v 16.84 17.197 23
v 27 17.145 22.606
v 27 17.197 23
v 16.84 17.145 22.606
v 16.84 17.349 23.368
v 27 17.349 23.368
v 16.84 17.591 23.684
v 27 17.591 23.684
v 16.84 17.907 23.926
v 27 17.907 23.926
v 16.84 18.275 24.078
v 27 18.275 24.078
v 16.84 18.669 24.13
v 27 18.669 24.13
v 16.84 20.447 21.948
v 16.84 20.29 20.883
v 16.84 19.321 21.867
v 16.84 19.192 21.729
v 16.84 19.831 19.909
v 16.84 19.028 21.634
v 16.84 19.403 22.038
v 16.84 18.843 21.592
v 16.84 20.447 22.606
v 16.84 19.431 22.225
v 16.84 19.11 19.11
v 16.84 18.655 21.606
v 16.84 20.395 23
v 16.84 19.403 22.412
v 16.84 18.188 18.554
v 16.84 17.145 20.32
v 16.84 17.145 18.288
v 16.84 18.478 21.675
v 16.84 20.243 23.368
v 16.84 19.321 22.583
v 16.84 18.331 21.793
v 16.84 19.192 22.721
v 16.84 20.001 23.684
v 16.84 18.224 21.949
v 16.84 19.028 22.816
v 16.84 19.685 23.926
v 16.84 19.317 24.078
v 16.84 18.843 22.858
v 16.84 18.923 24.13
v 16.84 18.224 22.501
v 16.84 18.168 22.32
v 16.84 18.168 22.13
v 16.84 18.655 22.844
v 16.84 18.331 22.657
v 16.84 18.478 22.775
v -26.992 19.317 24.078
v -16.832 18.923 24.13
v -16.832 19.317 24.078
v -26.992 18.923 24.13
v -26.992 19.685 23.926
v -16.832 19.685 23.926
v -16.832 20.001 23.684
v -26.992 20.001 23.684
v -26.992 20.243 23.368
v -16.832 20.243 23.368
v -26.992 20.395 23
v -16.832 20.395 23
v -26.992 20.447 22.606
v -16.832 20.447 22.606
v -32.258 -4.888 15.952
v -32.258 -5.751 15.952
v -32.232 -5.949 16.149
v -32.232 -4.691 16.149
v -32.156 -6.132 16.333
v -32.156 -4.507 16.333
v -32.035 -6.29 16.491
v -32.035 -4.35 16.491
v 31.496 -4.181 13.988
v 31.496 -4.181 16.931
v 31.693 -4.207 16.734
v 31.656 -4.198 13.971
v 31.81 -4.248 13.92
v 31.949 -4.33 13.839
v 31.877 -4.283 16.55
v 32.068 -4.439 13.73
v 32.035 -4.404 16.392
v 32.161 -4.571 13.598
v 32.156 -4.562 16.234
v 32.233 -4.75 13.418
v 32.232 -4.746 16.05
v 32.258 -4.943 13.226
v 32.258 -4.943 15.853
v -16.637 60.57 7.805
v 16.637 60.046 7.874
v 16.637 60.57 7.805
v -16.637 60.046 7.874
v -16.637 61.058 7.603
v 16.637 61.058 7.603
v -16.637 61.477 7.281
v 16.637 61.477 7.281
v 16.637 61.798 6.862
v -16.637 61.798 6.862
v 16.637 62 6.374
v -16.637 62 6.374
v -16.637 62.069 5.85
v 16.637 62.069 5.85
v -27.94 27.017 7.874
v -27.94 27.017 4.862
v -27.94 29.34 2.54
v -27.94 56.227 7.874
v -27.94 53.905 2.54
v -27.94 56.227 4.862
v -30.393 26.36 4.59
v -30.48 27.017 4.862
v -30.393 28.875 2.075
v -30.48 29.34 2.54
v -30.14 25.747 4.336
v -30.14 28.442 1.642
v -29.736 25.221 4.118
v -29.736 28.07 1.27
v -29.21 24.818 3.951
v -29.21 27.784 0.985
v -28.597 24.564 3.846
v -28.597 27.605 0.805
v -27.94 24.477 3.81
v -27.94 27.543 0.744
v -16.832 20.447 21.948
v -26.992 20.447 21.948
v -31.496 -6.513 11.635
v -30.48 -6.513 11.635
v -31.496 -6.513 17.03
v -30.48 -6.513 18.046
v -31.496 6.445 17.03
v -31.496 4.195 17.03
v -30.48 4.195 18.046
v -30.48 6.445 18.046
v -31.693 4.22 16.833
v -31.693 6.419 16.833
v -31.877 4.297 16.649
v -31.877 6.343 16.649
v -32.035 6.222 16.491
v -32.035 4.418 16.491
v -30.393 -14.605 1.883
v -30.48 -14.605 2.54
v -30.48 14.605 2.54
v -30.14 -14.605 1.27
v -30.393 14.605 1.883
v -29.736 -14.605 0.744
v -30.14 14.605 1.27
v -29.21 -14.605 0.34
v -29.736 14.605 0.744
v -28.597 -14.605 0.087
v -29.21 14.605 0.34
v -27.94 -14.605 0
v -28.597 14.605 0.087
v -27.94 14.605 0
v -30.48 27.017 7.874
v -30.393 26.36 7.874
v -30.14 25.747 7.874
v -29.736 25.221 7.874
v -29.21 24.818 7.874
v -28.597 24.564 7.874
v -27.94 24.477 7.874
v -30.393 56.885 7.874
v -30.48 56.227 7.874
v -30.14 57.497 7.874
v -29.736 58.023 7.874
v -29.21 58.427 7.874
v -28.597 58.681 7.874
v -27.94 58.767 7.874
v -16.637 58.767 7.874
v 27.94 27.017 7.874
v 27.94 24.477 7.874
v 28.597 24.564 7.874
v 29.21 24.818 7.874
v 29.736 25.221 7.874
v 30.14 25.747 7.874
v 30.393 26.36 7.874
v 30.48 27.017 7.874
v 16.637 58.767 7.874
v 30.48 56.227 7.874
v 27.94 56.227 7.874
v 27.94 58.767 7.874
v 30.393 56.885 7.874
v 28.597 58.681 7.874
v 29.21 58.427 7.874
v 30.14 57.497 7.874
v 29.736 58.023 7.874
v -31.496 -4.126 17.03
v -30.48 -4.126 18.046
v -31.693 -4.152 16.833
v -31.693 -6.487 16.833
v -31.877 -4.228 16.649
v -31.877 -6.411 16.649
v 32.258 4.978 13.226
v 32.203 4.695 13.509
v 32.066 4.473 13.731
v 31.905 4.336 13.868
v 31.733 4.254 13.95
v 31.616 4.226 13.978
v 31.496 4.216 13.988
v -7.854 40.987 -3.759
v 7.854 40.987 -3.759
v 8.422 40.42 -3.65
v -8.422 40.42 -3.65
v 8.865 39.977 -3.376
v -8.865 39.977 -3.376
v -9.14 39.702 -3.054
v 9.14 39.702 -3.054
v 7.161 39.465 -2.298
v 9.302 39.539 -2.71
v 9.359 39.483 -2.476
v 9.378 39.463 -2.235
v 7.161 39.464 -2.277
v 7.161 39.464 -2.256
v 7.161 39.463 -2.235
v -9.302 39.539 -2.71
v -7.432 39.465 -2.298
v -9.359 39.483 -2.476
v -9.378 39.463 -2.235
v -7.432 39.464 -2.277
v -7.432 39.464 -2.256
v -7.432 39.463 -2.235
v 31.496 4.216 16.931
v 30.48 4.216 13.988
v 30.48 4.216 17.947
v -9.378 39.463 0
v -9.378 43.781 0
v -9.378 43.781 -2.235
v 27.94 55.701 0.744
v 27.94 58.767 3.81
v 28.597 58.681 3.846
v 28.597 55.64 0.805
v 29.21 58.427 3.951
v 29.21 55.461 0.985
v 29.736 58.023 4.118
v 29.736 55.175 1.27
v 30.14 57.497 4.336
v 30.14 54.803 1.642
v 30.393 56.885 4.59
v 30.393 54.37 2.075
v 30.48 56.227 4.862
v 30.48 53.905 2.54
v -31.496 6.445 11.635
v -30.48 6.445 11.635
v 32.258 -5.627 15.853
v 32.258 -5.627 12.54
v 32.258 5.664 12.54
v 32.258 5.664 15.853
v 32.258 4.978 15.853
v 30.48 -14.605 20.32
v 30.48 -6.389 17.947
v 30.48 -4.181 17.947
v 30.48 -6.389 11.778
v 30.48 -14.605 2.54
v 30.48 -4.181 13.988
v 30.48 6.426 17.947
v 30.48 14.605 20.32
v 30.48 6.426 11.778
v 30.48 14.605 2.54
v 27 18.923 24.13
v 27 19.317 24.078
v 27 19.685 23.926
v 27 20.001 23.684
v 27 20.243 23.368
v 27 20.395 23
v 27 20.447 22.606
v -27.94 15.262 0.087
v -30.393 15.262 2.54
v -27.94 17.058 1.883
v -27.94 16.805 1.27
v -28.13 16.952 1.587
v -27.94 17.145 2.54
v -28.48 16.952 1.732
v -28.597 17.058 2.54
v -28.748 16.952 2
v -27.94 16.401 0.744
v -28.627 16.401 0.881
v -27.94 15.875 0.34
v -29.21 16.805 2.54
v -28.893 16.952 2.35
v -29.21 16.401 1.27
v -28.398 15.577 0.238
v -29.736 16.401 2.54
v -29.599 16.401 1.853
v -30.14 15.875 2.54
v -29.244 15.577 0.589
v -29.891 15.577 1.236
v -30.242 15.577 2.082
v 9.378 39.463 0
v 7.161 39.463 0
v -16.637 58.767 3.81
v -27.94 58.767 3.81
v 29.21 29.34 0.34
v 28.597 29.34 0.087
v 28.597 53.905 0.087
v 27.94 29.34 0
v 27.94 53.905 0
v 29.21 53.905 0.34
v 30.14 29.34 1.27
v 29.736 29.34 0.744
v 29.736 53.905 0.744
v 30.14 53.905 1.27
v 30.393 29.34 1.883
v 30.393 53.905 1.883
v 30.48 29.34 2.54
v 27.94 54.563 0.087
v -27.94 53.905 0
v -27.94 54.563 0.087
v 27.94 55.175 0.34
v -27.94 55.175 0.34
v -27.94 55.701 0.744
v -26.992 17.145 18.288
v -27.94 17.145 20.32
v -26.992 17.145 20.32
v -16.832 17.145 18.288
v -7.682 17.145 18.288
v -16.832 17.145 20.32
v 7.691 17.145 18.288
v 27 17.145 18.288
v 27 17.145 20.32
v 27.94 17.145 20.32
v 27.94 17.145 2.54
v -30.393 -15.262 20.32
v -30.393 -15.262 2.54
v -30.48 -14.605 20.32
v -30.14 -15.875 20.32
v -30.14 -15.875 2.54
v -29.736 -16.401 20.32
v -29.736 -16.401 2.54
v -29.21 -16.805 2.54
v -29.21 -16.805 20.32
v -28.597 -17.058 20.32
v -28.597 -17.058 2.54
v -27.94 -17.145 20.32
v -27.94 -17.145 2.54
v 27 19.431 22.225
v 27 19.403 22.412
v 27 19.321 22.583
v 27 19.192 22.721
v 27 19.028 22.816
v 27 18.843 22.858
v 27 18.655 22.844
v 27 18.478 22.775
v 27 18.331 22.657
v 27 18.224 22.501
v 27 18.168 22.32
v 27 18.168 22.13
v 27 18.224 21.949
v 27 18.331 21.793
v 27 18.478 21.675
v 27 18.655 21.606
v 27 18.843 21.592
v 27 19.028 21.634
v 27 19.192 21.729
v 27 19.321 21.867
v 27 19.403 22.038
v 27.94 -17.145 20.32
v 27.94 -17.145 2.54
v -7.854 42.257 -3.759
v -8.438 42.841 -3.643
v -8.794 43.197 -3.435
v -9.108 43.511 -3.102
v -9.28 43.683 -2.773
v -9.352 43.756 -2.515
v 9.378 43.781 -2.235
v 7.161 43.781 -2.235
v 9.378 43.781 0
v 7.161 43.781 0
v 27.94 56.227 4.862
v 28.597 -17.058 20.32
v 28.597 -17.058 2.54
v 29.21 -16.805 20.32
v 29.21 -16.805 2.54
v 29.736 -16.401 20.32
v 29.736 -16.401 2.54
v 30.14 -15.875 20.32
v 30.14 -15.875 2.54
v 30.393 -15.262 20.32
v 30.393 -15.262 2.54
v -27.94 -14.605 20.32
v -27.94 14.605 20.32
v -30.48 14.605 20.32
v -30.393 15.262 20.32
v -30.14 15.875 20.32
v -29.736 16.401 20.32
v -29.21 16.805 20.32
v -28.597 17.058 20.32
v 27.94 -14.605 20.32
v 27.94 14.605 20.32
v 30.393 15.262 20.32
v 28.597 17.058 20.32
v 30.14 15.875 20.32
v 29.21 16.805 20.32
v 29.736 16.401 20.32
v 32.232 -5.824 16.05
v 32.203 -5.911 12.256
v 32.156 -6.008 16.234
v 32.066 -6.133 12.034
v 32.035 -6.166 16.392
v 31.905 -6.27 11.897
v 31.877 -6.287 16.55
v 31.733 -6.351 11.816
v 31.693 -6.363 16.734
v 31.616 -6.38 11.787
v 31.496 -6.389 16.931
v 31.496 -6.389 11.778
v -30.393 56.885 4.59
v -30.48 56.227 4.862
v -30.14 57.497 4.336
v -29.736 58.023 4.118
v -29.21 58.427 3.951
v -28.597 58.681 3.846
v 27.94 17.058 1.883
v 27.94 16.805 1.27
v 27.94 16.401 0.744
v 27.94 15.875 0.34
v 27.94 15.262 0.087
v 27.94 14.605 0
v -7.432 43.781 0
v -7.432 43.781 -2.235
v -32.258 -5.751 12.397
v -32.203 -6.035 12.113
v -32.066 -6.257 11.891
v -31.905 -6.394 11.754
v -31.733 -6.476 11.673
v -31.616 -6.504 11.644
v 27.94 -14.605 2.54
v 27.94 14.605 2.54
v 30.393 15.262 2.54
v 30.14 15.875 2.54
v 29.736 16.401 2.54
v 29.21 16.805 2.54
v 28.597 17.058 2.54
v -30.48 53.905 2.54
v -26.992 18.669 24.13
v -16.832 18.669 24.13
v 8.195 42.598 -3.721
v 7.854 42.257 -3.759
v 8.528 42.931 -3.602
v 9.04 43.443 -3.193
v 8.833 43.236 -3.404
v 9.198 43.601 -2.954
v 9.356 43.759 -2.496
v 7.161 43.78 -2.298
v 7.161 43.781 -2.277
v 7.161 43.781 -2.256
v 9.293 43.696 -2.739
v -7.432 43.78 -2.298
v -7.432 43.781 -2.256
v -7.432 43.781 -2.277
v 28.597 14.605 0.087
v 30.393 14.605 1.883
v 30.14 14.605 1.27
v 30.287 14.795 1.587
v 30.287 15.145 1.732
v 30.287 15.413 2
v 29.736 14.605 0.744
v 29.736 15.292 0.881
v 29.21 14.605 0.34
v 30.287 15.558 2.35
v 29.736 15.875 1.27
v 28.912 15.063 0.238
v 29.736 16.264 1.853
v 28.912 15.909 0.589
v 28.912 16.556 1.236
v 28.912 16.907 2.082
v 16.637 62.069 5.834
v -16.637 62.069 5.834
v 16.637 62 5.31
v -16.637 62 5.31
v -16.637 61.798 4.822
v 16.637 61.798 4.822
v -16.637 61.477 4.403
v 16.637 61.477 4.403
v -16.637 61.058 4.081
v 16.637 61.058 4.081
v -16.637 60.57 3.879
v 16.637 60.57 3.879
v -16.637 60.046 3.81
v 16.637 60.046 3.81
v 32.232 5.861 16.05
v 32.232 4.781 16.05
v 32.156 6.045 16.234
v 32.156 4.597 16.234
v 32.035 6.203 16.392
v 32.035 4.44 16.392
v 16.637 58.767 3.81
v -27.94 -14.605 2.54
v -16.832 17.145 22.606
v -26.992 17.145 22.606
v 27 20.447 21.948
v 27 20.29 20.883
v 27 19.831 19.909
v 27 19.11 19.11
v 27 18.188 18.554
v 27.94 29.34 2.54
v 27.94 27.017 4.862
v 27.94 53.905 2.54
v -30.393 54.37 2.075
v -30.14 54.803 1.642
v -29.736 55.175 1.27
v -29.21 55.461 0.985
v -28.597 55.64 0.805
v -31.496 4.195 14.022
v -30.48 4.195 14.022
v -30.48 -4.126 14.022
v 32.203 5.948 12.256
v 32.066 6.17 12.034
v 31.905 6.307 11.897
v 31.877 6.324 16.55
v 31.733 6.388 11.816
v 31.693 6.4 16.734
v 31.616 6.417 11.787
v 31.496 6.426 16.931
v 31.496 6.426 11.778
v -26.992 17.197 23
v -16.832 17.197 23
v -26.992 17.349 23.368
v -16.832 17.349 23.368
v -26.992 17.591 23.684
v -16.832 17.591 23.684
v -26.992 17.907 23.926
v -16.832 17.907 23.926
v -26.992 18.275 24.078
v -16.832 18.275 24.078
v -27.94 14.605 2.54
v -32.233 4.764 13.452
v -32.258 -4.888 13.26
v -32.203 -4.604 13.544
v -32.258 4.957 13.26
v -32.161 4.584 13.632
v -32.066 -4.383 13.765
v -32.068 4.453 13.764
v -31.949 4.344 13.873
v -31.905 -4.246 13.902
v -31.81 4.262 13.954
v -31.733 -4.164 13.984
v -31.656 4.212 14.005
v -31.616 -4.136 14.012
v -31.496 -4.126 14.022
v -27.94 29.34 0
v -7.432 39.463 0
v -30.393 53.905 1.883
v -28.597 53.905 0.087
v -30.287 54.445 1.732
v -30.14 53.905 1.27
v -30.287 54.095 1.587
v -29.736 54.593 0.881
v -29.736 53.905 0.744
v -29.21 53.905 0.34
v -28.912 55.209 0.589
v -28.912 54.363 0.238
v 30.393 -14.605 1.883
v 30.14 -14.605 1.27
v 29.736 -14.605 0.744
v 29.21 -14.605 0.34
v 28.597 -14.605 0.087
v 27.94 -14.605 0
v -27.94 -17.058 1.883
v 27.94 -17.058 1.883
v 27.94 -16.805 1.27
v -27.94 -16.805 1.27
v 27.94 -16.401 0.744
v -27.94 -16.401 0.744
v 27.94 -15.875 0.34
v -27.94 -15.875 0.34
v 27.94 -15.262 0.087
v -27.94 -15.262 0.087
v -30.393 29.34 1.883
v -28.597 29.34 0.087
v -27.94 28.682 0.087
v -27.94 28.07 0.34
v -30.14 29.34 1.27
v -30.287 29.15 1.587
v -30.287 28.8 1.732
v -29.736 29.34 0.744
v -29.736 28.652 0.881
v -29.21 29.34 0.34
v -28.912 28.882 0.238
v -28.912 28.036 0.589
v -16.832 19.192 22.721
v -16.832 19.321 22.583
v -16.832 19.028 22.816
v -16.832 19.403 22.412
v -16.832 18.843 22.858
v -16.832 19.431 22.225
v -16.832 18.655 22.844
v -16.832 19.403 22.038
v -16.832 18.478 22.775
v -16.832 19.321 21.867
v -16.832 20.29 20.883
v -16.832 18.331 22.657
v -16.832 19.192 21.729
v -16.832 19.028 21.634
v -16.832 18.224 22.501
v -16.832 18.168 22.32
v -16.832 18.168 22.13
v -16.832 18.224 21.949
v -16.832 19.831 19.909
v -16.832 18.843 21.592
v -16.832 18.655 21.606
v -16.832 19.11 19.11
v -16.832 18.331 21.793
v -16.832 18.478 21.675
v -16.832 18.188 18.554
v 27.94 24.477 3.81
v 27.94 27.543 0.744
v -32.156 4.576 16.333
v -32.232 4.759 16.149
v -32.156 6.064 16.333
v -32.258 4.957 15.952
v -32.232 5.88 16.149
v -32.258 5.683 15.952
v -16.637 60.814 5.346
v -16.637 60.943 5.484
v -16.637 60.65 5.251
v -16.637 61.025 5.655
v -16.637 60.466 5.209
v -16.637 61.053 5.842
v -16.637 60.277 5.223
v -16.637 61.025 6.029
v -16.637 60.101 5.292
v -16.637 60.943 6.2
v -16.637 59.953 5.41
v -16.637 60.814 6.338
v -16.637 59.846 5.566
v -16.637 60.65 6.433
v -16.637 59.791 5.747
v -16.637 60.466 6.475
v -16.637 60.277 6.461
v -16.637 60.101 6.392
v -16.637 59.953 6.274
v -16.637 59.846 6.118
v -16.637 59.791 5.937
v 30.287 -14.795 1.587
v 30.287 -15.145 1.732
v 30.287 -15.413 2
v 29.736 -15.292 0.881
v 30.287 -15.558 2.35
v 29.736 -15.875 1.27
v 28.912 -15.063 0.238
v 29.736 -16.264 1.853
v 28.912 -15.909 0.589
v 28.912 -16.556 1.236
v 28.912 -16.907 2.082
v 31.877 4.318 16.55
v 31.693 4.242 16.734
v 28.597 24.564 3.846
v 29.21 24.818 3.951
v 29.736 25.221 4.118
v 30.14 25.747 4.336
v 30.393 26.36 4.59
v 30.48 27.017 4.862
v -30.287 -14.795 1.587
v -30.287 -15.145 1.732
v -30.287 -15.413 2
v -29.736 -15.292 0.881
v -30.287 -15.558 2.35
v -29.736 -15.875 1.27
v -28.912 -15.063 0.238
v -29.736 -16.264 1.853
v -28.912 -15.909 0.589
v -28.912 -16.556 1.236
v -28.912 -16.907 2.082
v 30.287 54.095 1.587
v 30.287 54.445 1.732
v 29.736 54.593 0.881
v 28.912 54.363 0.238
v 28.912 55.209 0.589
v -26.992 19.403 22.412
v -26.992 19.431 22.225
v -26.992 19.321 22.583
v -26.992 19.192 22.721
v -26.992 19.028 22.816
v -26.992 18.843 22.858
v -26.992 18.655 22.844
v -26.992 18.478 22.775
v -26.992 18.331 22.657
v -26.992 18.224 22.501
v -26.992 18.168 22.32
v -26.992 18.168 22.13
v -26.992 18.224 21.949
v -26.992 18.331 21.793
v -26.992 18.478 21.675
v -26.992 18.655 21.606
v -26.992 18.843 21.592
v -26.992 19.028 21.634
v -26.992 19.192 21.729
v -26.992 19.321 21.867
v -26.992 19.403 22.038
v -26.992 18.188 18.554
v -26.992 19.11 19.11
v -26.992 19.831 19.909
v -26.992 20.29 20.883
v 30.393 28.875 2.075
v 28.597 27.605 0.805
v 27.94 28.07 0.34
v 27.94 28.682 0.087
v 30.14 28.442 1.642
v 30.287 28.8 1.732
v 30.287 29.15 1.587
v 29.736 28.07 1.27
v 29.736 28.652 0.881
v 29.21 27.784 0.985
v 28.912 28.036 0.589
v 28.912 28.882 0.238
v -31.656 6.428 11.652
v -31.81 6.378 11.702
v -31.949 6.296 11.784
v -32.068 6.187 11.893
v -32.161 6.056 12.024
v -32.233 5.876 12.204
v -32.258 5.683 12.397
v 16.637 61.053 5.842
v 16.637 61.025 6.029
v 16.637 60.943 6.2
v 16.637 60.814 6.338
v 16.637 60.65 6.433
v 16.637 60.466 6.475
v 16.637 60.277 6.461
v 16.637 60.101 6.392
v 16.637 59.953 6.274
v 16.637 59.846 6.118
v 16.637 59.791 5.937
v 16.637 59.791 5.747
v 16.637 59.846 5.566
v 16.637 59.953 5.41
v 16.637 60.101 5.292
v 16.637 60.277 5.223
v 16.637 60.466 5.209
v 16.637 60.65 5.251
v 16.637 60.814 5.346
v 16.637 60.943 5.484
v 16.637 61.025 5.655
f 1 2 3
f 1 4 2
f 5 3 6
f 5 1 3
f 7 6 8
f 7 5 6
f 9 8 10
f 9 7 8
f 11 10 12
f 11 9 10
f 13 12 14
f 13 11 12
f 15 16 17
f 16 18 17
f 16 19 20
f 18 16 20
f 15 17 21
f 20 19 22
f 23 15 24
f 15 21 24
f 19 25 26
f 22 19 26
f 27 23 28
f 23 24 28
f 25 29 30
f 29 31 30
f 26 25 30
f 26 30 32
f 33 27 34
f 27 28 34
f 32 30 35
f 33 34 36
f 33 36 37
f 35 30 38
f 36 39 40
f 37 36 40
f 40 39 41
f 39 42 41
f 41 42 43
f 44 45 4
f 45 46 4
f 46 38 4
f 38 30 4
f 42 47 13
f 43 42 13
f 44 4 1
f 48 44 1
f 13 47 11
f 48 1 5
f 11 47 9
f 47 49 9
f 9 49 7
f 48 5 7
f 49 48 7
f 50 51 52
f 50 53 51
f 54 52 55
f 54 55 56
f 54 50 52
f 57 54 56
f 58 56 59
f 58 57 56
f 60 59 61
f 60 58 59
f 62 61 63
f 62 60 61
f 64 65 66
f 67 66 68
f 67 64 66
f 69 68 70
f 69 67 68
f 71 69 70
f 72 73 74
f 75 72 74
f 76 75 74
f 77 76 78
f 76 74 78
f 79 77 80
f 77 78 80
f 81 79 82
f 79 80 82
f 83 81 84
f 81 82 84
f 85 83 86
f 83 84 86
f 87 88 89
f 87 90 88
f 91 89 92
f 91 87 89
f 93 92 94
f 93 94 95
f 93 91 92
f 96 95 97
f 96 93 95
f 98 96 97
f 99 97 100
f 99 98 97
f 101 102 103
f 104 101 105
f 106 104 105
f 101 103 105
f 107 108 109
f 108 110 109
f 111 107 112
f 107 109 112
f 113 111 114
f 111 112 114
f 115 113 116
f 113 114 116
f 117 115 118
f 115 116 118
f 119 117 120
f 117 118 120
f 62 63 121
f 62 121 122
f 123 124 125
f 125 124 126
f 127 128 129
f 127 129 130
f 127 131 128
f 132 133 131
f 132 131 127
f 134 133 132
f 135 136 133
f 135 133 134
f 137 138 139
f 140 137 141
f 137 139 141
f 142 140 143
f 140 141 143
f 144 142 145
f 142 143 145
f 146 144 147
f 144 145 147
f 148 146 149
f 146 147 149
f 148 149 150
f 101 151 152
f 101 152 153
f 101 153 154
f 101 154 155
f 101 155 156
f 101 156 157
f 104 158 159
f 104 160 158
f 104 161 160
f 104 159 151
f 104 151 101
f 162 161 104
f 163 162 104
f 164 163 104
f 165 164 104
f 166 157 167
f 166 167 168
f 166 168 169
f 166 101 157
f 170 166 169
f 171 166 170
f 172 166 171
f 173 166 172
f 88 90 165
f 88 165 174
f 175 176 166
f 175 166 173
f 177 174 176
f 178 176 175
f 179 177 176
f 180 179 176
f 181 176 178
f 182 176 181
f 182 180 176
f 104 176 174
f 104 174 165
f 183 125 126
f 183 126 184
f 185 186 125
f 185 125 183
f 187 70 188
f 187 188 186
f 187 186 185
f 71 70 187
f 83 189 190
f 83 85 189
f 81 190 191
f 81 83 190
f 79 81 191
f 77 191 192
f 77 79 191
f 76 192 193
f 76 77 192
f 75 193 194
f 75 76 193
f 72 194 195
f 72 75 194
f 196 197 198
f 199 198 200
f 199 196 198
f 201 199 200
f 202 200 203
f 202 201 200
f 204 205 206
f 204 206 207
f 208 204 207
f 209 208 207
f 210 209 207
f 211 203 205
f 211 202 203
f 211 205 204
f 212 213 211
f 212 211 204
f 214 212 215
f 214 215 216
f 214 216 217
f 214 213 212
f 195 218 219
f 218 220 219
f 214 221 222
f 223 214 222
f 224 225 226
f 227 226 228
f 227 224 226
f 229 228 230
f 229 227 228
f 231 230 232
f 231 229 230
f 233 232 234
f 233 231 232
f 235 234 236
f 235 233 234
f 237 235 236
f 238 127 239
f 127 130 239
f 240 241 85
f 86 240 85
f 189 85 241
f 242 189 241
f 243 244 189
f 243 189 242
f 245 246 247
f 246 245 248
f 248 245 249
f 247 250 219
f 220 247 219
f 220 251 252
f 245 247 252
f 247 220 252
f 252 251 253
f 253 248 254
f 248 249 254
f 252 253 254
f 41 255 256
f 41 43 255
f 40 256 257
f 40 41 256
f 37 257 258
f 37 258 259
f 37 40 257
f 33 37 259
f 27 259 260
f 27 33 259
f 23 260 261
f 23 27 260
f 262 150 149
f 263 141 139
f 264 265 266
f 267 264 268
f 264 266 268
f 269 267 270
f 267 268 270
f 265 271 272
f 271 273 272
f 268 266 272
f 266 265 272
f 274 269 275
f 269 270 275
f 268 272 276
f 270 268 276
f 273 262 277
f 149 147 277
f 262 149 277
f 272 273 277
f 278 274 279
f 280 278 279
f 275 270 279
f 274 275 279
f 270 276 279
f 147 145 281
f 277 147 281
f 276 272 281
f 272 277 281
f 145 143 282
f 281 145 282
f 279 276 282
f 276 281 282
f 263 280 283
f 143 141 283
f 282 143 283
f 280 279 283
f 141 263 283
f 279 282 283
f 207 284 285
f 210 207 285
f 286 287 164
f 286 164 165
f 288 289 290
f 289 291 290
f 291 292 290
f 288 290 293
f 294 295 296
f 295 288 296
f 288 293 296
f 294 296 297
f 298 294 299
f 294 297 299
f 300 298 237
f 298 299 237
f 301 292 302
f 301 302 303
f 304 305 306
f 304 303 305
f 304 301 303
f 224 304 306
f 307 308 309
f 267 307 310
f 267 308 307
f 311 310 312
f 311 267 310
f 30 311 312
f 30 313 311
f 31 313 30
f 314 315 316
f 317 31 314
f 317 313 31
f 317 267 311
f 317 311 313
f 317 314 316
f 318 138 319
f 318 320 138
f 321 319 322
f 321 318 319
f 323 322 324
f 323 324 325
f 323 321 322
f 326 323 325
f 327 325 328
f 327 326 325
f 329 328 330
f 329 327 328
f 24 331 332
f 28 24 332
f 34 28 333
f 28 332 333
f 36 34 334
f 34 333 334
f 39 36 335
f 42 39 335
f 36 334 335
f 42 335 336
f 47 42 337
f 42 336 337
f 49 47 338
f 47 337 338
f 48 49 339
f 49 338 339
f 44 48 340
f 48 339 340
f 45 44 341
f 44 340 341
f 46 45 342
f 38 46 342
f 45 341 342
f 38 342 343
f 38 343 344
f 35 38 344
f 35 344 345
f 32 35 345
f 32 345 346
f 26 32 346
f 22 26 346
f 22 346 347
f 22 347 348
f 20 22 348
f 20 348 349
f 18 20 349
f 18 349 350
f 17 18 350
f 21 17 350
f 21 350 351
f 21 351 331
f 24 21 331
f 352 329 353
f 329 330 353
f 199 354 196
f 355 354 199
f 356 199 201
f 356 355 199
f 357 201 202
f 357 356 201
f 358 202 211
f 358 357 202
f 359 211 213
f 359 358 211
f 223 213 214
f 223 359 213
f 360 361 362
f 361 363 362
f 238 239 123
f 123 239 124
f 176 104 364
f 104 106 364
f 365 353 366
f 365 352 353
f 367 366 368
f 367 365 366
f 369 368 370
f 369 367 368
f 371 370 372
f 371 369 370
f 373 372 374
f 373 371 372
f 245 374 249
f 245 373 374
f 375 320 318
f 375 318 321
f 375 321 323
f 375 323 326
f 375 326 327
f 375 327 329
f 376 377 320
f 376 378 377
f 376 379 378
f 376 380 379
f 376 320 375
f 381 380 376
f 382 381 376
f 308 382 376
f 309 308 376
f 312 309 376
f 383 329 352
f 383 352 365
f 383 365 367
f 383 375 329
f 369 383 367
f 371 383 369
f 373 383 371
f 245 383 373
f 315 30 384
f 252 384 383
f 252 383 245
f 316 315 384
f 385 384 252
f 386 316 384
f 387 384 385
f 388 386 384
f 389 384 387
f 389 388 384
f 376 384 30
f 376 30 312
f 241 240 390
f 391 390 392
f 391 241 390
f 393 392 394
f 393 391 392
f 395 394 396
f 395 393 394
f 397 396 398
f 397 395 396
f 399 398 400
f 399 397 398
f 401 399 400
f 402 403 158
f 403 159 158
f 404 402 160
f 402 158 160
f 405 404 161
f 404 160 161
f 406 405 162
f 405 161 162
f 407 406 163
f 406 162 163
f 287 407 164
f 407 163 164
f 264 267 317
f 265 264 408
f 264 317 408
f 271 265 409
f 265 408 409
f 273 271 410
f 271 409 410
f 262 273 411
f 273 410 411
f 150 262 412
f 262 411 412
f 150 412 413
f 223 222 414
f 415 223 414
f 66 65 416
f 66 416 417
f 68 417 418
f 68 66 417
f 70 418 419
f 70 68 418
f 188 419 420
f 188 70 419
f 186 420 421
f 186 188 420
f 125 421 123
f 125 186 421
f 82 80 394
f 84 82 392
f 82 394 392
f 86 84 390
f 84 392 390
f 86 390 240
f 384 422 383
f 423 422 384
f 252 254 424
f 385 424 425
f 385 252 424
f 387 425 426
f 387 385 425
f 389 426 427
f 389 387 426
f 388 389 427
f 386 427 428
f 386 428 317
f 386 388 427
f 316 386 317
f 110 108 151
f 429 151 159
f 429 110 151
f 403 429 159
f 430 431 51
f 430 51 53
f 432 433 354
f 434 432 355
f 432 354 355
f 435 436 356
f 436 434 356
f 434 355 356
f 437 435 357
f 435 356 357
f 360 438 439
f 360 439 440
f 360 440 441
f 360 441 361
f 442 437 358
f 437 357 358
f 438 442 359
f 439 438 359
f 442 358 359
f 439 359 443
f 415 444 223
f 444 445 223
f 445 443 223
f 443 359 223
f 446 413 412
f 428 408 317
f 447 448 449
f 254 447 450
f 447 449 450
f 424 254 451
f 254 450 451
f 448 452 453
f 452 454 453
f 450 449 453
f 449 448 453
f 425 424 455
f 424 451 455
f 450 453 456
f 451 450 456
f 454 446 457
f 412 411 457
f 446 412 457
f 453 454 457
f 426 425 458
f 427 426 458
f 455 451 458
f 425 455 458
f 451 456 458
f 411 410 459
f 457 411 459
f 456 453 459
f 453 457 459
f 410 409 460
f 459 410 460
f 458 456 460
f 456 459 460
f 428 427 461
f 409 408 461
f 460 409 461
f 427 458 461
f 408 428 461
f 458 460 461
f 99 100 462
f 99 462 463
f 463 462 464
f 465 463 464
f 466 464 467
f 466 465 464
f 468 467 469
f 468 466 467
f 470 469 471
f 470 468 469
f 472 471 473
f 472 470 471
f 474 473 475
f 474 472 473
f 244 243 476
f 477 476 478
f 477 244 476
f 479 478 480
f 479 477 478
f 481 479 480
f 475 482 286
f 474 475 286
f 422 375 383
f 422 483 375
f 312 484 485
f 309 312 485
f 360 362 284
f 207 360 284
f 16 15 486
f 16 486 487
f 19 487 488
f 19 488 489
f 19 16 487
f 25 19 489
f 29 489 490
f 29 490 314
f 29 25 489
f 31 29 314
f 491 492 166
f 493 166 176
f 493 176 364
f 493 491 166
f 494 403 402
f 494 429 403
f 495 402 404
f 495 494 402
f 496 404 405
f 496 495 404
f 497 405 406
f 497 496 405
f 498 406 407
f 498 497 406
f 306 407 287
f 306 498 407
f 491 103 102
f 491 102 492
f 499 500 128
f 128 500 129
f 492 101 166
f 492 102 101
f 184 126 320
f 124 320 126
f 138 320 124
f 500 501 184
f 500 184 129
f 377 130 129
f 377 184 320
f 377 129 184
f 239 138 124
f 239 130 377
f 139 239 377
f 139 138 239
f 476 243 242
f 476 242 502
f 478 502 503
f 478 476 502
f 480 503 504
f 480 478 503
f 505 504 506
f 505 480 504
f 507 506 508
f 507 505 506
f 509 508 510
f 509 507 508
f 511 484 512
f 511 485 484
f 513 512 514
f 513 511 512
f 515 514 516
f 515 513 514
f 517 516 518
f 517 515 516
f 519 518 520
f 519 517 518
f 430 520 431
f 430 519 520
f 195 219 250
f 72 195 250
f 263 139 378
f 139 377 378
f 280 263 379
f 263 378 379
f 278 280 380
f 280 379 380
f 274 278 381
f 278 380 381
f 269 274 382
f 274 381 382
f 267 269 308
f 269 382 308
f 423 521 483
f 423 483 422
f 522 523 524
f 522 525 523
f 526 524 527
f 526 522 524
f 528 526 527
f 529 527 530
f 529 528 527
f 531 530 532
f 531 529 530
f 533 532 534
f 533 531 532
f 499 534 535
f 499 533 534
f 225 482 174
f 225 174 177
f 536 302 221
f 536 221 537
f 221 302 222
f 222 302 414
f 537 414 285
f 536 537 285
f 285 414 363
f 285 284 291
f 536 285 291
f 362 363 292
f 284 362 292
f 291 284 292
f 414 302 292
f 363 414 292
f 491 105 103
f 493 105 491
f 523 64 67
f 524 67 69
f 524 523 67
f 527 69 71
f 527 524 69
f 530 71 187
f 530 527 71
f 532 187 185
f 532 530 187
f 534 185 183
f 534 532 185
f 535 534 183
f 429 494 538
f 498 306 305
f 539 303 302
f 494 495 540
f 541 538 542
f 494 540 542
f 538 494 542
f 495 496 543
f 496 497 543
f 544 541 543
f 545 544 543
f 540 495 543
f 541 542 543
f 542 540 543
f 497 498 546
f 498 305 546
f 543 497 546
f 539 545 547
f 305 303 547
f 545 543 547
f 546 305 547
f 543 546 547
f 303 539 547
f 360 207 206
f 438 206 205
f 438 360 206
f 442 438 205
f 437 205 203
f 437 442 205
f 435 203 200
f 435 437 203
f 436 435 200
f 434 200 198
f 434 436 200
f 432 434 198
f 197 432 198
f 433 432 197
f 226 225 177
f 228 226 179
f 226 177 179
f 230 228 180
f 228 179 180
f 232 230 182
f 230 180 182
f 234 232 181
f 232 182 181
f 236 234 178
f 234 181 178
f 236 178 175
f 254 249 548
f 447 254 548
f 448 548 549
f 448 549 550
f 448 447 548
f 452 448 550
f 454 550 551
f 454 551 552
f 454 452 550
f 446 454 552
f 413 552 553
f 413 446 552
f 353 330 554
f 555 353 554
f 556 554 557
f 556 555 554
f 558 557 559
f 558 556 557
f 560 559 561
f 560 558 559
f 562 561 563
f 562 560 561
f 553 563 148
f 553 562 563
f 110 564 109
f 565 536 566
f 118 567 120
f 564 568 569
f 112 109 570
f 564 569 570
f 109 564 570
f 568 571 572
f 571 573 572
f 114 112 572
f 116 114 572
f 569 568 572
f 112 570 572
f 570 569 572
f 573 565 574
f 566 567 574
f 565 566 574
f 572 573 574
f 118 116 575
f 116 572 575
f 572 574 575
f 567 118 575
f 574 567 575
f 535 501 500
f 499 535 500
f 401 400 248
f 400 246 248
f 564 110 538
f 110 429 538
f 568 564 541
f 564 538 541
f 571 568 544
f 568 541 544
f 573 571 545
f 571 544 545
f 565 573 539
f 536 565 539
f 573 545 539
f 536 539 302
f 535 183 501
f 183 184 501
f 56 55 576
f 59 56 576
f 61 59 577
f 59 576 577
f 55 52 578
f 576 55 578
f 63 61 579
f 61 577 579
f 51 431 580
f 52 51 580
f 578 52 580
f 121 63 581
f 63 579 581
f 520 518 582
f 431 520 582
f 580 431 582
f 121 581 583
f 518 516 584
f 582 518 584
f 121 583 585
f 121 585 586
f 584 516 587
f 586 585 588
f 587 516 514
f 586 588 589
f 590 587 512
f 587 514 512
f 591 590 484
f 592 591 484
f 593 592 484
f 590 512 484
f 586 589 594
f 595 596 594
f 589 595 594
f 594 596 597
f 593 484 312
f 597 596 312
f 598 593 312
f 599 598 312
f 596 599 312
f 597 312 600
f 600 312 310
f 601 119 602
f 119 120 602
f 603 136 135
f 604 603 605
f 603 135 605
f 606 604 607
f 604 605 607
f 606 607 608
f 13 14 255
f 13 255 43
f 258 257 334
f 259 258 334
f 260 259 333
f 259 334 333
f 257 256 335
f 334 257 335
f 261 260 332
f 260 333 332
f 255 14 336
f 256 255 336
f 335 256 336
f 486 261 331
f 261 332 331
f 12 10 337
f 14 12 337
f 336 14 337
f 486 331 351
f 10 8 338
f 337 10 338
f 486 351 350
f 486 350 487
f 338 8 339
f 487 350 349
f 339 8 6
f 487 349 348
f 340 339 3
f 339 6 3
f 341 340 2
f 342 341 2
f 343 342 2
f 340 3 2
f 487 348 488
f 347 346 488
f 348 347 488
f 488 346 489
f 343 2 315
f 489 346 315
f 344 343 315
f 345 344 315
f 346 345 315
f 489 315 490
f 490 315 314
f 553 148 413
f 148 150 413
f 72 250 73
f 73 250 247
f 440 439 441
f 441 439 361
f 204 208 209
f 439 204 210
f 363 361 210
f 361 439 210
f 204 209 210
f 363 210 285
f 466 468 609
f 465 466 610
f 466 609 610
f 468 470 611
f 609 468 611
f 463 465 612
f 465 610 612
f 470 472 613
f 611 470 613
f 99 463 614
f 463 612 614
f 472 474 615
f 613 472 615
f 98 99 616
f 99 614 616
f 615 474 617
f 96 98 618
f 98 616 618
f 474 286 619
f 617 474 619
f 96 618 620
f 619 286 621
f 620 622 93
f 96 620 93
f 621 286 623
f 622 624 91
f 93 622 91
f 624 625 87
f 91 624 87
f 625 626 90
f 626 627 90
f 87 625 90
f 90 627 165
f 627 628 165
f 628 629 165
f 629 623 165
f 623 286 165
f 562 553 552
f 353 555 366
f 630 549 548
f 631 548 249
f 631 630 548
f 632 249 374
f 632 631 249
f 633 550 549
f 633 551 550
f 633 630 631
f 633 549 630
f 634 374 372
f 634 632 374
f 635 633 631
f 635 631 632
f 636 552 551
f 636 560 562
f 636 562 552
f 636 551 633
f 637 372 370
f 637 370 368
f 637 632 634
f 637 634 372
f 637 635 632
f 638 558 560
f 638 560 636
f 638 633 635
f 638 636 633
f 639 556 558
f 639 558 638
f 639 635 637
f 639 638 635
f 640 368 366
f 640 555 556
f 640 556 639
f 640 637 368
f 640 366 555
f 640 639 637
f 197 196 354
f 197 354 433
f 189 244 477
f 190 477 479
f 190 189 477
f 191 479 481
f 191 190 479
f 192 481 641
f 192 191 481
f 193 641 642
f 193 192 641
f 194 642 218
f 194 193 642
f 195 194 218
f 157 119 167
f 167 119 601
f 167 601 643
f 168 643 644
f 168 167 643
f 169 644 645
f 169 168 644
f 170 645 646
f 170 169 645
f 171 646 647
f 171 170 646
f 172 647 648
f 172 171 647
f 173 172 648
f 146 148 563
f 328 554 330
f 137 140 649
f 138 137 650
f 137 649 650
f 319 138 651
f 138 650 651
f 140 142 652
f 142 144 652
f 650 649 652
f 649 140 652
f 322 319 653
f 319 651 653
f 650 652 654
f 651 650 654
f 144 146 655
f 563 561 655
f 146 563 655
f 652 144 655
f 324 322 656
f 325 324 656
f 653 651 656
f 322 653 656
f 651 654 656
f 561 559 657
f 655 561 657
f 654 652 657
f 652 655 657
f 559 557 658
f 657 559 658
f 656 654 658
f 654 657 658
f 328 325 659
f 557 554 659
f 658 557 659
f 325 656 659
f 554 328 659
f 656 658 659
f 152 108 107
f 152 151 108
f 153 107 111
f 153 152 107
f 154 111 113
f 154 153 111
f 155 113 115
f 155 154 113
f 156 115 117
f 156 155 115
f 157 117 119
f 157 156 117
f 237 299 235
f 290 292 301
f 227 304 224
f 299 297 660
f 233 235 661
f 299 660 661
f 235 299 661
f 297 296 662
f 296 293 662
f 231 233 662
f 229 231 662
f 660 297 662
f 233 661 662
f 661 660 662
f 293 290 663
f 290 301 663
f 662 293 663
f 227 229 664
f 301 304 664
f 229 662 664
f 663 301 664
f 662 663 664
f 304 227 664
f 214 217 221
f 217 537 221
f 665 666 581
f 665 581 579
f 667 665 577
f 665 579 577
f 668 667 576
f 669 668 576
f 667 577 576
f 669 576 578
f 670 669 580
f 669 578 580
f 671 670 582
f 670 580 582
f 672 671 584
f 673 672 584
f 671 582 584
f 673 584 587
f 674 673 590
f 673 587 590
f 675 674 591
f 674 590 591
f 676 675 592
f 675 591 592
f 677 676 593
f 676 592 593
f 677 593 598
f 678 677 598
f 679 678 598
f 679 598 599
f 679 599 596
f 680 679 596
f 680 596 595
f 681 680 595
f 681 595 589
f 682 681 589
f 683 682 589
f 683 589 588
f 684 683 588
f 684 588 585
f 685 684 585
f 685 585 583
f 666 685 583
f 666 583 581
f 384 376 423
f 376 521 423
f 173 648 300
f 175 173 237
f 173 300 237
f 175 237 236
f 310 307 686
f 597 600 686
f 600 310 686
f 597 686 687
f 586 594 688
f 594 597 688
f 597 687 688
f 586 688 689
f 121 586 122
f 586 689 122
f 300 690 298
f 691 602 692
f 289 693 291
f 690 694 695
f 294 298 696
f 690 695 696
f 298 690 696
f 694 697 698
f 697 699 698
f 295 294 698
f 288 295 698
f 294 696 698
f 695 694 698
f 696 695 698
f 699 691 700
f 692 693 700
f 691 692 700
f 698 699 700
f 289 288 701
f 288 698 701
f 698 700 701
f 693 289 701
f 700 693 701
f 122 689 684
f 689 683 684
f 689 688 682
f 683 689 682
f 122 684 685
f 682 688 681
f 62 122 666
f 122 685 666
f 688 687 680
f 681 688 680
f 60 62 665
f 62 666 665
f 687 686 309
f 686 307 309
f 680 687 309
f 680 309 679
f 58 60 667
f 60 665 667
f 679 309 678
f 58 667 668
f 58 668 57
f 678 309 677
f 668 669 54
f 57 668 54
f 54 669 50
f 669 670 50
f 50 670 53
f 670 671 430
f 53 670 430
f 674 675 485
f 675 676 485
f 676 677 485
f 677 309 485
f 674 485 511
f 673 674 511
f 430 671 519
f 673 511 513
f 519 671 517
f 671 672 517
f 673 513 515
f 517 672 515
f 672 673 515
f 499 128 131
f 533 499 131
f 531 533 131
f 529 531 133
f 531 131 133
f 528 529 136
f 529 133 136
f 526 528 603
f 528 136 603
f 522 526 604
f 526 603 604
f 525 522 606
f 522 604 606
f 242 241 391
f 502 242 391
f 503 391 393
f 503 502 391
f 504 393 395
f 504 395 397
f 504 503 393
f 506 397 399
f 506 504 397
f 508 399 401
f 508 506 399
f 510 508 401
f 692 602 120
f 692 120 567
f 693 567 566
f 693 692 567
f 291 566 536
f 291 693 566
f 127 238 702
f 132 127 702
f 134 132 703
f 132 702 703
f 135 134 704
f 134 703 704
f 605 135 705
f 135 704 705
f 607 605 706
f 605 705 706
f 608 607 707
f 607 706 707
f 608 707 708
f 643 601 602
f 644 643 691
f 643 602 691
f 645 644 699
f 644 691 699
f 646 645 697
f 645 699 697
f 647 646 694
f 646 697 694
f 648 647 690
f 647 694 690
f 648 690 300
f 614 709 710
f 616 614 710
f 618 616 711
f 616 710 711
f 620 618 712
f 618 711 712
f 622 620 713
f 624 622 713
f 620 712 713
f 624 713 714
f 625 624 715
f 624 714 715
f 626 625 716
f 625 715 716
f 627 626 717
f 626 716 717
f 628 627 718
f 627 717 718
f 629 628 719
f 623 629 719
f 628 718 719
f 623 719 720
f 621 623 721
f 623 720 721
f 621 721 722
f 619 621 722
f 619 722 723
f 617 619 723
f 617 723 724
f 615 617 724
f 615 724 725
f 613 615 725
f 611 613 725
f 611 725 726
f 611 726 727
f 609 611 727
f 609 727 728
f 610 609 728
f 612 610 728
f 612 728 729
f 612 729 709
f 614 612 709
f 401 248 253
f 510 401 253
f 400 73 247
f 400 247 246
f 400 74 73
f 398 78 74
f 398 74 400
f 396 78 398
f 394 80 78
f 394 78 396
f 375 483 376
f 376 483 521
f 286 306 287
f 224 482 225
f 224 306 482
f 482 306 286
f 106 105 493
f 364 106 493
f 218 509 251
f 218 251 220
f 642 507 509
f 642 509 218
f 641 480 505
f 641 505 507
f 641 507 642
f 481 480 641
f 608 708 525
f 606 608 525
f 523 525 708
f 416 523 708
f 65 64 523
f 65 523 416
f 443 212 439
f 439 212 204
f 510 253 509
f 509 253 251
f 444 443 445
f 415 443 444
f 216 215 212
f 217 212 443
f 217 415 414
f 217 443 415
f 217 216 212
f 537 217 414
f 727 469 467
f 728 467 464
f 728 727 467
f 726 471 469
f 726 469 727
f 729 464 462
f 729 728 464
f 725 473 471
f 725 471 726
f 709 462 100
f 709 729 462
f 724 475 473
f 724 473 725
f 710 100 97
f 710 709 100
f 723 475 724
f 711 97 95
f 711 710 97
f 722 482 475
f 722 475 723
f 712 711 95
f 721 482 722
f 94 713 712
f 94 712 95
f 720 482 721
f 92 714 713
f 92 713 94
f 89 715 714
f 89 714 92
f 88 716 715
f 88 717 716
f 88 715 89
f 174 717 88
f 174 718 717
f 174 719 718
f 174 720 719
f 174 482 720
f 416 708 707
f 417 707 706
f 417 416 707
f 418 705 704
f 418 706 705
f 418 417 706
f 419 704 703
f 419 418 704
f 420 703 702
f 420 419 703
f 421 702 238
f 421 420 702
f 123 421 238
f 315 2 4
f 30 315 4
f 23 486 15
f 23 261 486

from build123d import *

# Parameters (mm, degrees)
F0_W           = 60.96
F0_H           = 34.29
F1_DEPTH       = 20.32
F2_T           = -2.54
F3_R           = 2.54
F4_W           = 60.96
F4_H           = 34.29
F5_DEPTH       = 7.874
F6_SIZE        = 3.81
F7_T           = -2.54
F8_W           = 10.16
F8_H           = 3.81
F8_H_2         = 2.032
F9_DEPTH       = 3.302
F10_R          = 2.54
F12_D          = 1.27
F14_DEPTH      = 3.7592
F15_W          = 14.5933912136
F15_H          = 2.2978205234
F16_DEPTH      = 25.4
F17_F1_R       = 1.524
F17_F2_R       = 1.524
F17_F3_R       = 1.524
F17_F4_R       = 1.524
F17_2_T1_DEPTH = 26.3766839159
F17_2_T3_DEPTH = 11.938
F19_T1_DEPTH   = 28.459343391
F19_T3_DEPTH   = 28.459343391
F18_W          = 33.274
F18_H          = 4.064
F20_DEPTH      = 3.302
F22_D          = 1.27
F23_R          = 2.023593808
F26_DEPTH      = 1.778
F27_SIZE       = 1.77799
F28_R          = 0.762
F29_DEPTH      = 1.778
F30_SIZE       = 1.77799
F31_R          = 0.762


# Not quite as in the source:
# - a fillet or chamfer that OpenCascade refuses, or shapes differently, is made with other operations: its cross-section is extruded or revolved along the edge and cut away or added
# - a fillet or chamfer is up to 0.001 mm smaller than in the source, because OpenCascade refuses the exact size


with BuildPart() as f1:
    # F0 (on Top) → F1 (new body)
    with BuildSketch(Plane.XY):
        Rectangle(F0_W, F0_H)
    extrude(amount=F1_DEPTH)

    # F2
    f2_openings = [f1.faces().sort_by_distance(p)[0] for p in [
        (0, 0, 20.32),
    ]]
    offset(amount=F2_T, openings=f2_openings)

    # F3
    f3_edges = [f1.edges().sort_by_distance(p)[0] for p in [
        (0, -17.145, 0),
        (-30.48, 0, 0),
        (0, 17.145, 0),
        (30.48, 0, 0),
        (-30.48, -17.145, 10.16),
        (-30.48, 17.145, 10.16),
        (30.48, 17.145, 10.16),
        (30.48, -17.145, 10.16),
    ]]
    fillet(f3_edges, radius=F3_R)

    # F8 (on face) → F9 (join)
    with BuildSketch(Plane(origin=(0, 17.145, 0), x_dir=(-1, 0, 0), z_dir=(0, 1, 0))):
        with Locations((21.9121703571, 22.225)):
            Rectangle(F8_W, F8_H)
        with Locations((21.9121703571, 19.304)):
            Rectangle(F8_W, F8_H_2)
        with Locations((-21.9202, 19.304)):
            Rectangle(F8_W, F8_H_2)
        with Locations((-21.9202, 22.225)):
            Rectangle(F8_W, F8_H)
    extrude(amount=F9_DEPTH)

    # F12 (through all)
    with Locations(Plane(origin=(-26.9921703571, 0, 0), x_dir=(0, -1, 0), z_dir=(-1, 0, 0))):
        with Locations((-18.796, 22.225)):
            Hole(F12_D / 2)

    # F17: fillet of radius 1.524 on 4 edges, made by hand

    # F17_f1
    f17_f1_edges = [f1.edges().sort_by_distance(p)[0] for p in [
        (21.9202, 17.145, 24.13),
    ]]
    fillet(f17_f1_edges, radius=F17_F1_R)

    # F17_f2
    f17_f2_edges = [f1.edges().sort_by_distance(p)[0] for p in [
        (-21.9121703571, 17.145, 24.13),
    ]]
    fillet(f17_f2_edges, radius=F17_F2_R)

    # F17_f3
    f17_f3_edges = [f1.edges().sort_by_distance(p)[0] for p in [
        (-21.9121703571, 20.447, 24.13),
    ]]
    fillet(f17_f3_edges, radius=F17_F3_R)

    # F17_f4
    f17_f4_edges = [f1.edges().sort_by_distance(p)[0] for p in [
        (21.9202, 20.447, 24.13),
    ]]
    fillet(f17_f4_edges, radius=F17_F4_R)

    # F19: fillet of radius 3.6792614691 on 2 edges, made by hand

    # F19_s2 → F19_t1 (cut)
    with BuildSketch(Plane.YZ.offset(-36.1418420526)):
        with BuildLine():
            ThreePointArc((17.145, 18.288), (19.4994969888, 19.4832265773), (20.447, 21.9478686782))
            Line((20.447, 21.9478686782), (20.447, 18.288))
            Line((20.447, 18.288), (17.145, 18.288))
        make_face()
    extrude(amount=F19_T1_DEPTH, mode=Mode.SUBTRACT)

    # F19_s4 → F19_t3 (cut)
    with BuildSketch(Plane.YZ.offset(7.6905283045)):
        with BuildLine():
            ThreePointArc((20.447, 21.9478686782), (19.4994969888, 19.4832265773), (17.145, 18.288))
            Line((17.145, 18.288), (20.447, 18.288))
            Line((20.447, 18.288), (20.447, 21.9478686782))
        make_face()
    extrude(amount=F19_T3_DEPTH, mode=Mode.SUBTRACT)

    # F25 (on face) → F26 (join)
    with BuildSketch(Plane(origin=(-30.48, 0, 0), x_dir=(0, -1, 0), z_dir=(-1, 0, 0))):
        Polygon((-4.1945250705, 18.0457551032), (-6.445246283, 18.0457551032), (-6.445246283, 11.6346105933), (6.5134512261, 11.6346105933), (6.5134512261, 18.0457551032), (4.12632199, 18.0457551032), (4.12632199, 14.0217393637), (-4.1945250705, 14.0217393637), align=None)
    extrude(amount=F26_DEPTH)

    # F27 (size 1.778 in the source; OpenCascade refuses exactly that, so slightly less here)
    f27_edges = [f1.edges().sort_by_distance(p)[0] for p in [
        (-32.258, 5.319886, 18.045755),
        (-32.258, -5.319887, 18.045755),
    ]]
    chamfer(f27_edges, length=F27_SIZE)

    # F28
    f28_edges = [f1.edges().sort_by_distance(p)[0] for p in [
        (-32.258, 6.445246, 13.951188),
        (-32.258, 5.319886, 16.267765),
        (-32.258, -0.034102, 11.634611),
        (-32.258, 4.194525, 15.144752),
        (-32.258, -6.513451, 13.951188),
        (-32.258, 0.034102, 14.021739),
        (-32.258, -5.319887, 16.267765),
        (-32.258, -4.126322, 15.144752),
    ]]
    fillet(f28_edges, radius=F28_R)

    # F24 (on face) → F29 (join)
    with BuildSketch(Plane.YZ.offset(30.48)):
        Polygon((-4.1808448732, 17.946805805), (-6.3891597092, 17.946805805), (-6.3891597092, 11.7778191343), (6.4262, 11.7778191343), (6.4262, 17.946805805), (4.2164, 17.946805805), (4.2164, 13.9876191343), (-4.1808448732, 13.9876191343), align=None)
    extrude(amount=F29_DEPTH)

    # F30 (size 1.778 in the source; OpenCascade refuses exactly that, so slightly less here)
    f30_edges = [f1.edges().sort_by_distance(p)[0] for p in [
        (32.258, -5.285002, 17.946806),
        (32.258, 5.3213, 17.946806),
    ]]
    chamfer(f30_edges, length=F30_SIZE)

    # F31
    f31_edges = [f1.edges().sort_by_distance(p)[0] for p in [
        (32.258, -6.38916, 13.973317),
        (32.258, -5.285002, 16.168816),
        (32.258, 0.01852, 11.777819),
        (32.258, -4.180845, 15.078217),
        (32.258, 6.4262, 13.973317),
        (32.258, 0.017778, 13.987619),
        (32.258, 5.3213, 16.168816),
        (32.258, 4.2164, 15.078217),
    ]]
    fillet(f31_edges, radius=F31_R)


with BuildPart() as f5:
    # F4 (on Top) → F5 (new body)
    with BuildSketch(Plane.XY):
        with Locations((0, 41.6224255873)):
            Rectangle(F4_W, F4_H)
    extrude(amount=F5_DEPTH)

    # F6
    f6_edges = [f5.edges().sort_by_distance(p)[0] for p in [
        (0, 58.767426, 0),
        (0, 24.477426, 0),
    ]]
    chamfer(f6_edges, length=F6_SIZE)

    # F7
    f7_openings = [f5.faces().sort_by_distance(p)[0] for p in [
        (0, 41.622426, 7.874),
    ]]
    offset(amount=F7_T, openings=f7_openings)

    # F10
    f10_edges = [f5.edges().sort_by_distance(p)[0] for p in [
        (0, 54.957426, 0),
        (0, 28.287426, 0),
        (30.48, 26.382426, 1.905),
        (30.48, 41.622426, 0),
        (30.48, 56.862426, 1.905),
        (-30.48, 56.862426, 1.905),
        (-30.48, 41.622426, 0),
        (-30.48, 58.767426, 5.842),
        (-30.48, 26.382426, 1.905),
        (-30.48, 24.477426, 5.842),
        (30.48, 24.477426, 5.842),
        (30.48, 58.767426, 5.842),
    ]]
    fillet(f10_edges, radius=F10_R)

    # F13 (on face) → F14 (join)
    with BuildSketch(Plane(origin=(0, 0, 0), x_dir=(1, 0, 0), z_dir=(0, 0, -1))):
        Polygon((-9.3783419579, -43.7814255873), (0, -43.7814255873), (9.3783419579, -43.7814255873), (9.3783419579, -39.4634255873), (-9.3783419579, -39.4634255873), align=None)
    extrude(amount=F14_DEPTH)

    # F15 (on face) → F16 (cut)
    with BuildSketch(Plane.XZ.offset(-39.4634255873)):
        with Locations((-0.1355621498, -1.1489102617)):
            Rectangle(F15_W, F15_H)
    extrude(amount=-F16_DEPTH, mode=Mode.SUBTRACT)

    # F17#2: fillet of radius 1.524 on 4 edges, made by hand

    # F17_2_s2 → F17_2_t1 (cut)
    with BuildSketch(Plane.YZ.offset(-13.1883419579)):
        with BuildLine():
            ThreePointArc((42.2574255873, -3.7592), (43.3350563218, -3.3128307345), (43.7814255873, -2.2352))
            Line((43.7814255873, -2.2352), (43.7814255873, -3.7592))
            Line((43.7814255873, -3.7592), (42.2574255873, -3.7592))
        make_face()
        with BuildLine():
            ThreePointArc((40.9874255873, -3.7592), (39.9097948527, -3.3128307345), (39.4634255873, -2.2352))
            Line((39.4634255873, -2.2352), (39.4634255873, -3.7592))
            Line((39.4634255873, -3.7592), (40.9874255873, -3.7592))
        make_face()
    extrude(amount=F17_2_T1_DEPTH, mode=Mode.SUBTRACT)

    # F17_2_s4 → F17_2_t3 (cut)
    with BuildSketch(Plane.XZ.offset(-47.5914255873)):
        with BuildLine():
            ThreePointArc((9.3783419579, -2.2352), (8.9319726925, -3.3128307345), (7.8543419579, -3.7592))
            Line((7.8543419579, -3.7592), (9.3783419579, -3.7592))
            Line((9.3783419579, -3.7592), (9.3783419579, -2.2352))
        make_face()
        with BuildLine():
            ThreePointArc((-7.8543419579, -3.7592), (-8.9319726925, -3.3128307345), (-9.3783419579, -2.2352))
            Line((-9.3783419579, -2.2352), (-9.3783419579, -3.7592))
            Line((-9.3783419579, -3.7592), (-7.8543419579, -3.7592))
        make_face()
    extrude(amount=F17_2_T3_DEPTH, mode=Mode.SUBTRACT)

    # F18 (on face) → F20 (join)
    with BuildSketch(Plane(origin=(0, 58.7674255873, 0), x_dir=(-1, 0, 0), z_dir=(0, 1, 0))):
        with Locations((0, 5.842)):
            Rectangle(F18_W, F18_H)
    extrude(amount=F20_DEPTH)

    # F22 (through all)
    with Locations(Plane(origin=(-16.637, 0, 0), x_dir=(0, -1, 0), z_dir=(-1, 0, 0))):
        with Locations((-60.4184255873, 5.842)):
            Hole(F22_D / 2)

    # F23
    f23_edges = [f5.edges().sort_by_distance(p)[0] for p in [
        (0, 62.069426, 7.874),
        (0, 62.069426, 3.81),
    ]]
    fillet(f23_edges, radius=F23_R)


solid = Compound([f1.part, f5.part])
